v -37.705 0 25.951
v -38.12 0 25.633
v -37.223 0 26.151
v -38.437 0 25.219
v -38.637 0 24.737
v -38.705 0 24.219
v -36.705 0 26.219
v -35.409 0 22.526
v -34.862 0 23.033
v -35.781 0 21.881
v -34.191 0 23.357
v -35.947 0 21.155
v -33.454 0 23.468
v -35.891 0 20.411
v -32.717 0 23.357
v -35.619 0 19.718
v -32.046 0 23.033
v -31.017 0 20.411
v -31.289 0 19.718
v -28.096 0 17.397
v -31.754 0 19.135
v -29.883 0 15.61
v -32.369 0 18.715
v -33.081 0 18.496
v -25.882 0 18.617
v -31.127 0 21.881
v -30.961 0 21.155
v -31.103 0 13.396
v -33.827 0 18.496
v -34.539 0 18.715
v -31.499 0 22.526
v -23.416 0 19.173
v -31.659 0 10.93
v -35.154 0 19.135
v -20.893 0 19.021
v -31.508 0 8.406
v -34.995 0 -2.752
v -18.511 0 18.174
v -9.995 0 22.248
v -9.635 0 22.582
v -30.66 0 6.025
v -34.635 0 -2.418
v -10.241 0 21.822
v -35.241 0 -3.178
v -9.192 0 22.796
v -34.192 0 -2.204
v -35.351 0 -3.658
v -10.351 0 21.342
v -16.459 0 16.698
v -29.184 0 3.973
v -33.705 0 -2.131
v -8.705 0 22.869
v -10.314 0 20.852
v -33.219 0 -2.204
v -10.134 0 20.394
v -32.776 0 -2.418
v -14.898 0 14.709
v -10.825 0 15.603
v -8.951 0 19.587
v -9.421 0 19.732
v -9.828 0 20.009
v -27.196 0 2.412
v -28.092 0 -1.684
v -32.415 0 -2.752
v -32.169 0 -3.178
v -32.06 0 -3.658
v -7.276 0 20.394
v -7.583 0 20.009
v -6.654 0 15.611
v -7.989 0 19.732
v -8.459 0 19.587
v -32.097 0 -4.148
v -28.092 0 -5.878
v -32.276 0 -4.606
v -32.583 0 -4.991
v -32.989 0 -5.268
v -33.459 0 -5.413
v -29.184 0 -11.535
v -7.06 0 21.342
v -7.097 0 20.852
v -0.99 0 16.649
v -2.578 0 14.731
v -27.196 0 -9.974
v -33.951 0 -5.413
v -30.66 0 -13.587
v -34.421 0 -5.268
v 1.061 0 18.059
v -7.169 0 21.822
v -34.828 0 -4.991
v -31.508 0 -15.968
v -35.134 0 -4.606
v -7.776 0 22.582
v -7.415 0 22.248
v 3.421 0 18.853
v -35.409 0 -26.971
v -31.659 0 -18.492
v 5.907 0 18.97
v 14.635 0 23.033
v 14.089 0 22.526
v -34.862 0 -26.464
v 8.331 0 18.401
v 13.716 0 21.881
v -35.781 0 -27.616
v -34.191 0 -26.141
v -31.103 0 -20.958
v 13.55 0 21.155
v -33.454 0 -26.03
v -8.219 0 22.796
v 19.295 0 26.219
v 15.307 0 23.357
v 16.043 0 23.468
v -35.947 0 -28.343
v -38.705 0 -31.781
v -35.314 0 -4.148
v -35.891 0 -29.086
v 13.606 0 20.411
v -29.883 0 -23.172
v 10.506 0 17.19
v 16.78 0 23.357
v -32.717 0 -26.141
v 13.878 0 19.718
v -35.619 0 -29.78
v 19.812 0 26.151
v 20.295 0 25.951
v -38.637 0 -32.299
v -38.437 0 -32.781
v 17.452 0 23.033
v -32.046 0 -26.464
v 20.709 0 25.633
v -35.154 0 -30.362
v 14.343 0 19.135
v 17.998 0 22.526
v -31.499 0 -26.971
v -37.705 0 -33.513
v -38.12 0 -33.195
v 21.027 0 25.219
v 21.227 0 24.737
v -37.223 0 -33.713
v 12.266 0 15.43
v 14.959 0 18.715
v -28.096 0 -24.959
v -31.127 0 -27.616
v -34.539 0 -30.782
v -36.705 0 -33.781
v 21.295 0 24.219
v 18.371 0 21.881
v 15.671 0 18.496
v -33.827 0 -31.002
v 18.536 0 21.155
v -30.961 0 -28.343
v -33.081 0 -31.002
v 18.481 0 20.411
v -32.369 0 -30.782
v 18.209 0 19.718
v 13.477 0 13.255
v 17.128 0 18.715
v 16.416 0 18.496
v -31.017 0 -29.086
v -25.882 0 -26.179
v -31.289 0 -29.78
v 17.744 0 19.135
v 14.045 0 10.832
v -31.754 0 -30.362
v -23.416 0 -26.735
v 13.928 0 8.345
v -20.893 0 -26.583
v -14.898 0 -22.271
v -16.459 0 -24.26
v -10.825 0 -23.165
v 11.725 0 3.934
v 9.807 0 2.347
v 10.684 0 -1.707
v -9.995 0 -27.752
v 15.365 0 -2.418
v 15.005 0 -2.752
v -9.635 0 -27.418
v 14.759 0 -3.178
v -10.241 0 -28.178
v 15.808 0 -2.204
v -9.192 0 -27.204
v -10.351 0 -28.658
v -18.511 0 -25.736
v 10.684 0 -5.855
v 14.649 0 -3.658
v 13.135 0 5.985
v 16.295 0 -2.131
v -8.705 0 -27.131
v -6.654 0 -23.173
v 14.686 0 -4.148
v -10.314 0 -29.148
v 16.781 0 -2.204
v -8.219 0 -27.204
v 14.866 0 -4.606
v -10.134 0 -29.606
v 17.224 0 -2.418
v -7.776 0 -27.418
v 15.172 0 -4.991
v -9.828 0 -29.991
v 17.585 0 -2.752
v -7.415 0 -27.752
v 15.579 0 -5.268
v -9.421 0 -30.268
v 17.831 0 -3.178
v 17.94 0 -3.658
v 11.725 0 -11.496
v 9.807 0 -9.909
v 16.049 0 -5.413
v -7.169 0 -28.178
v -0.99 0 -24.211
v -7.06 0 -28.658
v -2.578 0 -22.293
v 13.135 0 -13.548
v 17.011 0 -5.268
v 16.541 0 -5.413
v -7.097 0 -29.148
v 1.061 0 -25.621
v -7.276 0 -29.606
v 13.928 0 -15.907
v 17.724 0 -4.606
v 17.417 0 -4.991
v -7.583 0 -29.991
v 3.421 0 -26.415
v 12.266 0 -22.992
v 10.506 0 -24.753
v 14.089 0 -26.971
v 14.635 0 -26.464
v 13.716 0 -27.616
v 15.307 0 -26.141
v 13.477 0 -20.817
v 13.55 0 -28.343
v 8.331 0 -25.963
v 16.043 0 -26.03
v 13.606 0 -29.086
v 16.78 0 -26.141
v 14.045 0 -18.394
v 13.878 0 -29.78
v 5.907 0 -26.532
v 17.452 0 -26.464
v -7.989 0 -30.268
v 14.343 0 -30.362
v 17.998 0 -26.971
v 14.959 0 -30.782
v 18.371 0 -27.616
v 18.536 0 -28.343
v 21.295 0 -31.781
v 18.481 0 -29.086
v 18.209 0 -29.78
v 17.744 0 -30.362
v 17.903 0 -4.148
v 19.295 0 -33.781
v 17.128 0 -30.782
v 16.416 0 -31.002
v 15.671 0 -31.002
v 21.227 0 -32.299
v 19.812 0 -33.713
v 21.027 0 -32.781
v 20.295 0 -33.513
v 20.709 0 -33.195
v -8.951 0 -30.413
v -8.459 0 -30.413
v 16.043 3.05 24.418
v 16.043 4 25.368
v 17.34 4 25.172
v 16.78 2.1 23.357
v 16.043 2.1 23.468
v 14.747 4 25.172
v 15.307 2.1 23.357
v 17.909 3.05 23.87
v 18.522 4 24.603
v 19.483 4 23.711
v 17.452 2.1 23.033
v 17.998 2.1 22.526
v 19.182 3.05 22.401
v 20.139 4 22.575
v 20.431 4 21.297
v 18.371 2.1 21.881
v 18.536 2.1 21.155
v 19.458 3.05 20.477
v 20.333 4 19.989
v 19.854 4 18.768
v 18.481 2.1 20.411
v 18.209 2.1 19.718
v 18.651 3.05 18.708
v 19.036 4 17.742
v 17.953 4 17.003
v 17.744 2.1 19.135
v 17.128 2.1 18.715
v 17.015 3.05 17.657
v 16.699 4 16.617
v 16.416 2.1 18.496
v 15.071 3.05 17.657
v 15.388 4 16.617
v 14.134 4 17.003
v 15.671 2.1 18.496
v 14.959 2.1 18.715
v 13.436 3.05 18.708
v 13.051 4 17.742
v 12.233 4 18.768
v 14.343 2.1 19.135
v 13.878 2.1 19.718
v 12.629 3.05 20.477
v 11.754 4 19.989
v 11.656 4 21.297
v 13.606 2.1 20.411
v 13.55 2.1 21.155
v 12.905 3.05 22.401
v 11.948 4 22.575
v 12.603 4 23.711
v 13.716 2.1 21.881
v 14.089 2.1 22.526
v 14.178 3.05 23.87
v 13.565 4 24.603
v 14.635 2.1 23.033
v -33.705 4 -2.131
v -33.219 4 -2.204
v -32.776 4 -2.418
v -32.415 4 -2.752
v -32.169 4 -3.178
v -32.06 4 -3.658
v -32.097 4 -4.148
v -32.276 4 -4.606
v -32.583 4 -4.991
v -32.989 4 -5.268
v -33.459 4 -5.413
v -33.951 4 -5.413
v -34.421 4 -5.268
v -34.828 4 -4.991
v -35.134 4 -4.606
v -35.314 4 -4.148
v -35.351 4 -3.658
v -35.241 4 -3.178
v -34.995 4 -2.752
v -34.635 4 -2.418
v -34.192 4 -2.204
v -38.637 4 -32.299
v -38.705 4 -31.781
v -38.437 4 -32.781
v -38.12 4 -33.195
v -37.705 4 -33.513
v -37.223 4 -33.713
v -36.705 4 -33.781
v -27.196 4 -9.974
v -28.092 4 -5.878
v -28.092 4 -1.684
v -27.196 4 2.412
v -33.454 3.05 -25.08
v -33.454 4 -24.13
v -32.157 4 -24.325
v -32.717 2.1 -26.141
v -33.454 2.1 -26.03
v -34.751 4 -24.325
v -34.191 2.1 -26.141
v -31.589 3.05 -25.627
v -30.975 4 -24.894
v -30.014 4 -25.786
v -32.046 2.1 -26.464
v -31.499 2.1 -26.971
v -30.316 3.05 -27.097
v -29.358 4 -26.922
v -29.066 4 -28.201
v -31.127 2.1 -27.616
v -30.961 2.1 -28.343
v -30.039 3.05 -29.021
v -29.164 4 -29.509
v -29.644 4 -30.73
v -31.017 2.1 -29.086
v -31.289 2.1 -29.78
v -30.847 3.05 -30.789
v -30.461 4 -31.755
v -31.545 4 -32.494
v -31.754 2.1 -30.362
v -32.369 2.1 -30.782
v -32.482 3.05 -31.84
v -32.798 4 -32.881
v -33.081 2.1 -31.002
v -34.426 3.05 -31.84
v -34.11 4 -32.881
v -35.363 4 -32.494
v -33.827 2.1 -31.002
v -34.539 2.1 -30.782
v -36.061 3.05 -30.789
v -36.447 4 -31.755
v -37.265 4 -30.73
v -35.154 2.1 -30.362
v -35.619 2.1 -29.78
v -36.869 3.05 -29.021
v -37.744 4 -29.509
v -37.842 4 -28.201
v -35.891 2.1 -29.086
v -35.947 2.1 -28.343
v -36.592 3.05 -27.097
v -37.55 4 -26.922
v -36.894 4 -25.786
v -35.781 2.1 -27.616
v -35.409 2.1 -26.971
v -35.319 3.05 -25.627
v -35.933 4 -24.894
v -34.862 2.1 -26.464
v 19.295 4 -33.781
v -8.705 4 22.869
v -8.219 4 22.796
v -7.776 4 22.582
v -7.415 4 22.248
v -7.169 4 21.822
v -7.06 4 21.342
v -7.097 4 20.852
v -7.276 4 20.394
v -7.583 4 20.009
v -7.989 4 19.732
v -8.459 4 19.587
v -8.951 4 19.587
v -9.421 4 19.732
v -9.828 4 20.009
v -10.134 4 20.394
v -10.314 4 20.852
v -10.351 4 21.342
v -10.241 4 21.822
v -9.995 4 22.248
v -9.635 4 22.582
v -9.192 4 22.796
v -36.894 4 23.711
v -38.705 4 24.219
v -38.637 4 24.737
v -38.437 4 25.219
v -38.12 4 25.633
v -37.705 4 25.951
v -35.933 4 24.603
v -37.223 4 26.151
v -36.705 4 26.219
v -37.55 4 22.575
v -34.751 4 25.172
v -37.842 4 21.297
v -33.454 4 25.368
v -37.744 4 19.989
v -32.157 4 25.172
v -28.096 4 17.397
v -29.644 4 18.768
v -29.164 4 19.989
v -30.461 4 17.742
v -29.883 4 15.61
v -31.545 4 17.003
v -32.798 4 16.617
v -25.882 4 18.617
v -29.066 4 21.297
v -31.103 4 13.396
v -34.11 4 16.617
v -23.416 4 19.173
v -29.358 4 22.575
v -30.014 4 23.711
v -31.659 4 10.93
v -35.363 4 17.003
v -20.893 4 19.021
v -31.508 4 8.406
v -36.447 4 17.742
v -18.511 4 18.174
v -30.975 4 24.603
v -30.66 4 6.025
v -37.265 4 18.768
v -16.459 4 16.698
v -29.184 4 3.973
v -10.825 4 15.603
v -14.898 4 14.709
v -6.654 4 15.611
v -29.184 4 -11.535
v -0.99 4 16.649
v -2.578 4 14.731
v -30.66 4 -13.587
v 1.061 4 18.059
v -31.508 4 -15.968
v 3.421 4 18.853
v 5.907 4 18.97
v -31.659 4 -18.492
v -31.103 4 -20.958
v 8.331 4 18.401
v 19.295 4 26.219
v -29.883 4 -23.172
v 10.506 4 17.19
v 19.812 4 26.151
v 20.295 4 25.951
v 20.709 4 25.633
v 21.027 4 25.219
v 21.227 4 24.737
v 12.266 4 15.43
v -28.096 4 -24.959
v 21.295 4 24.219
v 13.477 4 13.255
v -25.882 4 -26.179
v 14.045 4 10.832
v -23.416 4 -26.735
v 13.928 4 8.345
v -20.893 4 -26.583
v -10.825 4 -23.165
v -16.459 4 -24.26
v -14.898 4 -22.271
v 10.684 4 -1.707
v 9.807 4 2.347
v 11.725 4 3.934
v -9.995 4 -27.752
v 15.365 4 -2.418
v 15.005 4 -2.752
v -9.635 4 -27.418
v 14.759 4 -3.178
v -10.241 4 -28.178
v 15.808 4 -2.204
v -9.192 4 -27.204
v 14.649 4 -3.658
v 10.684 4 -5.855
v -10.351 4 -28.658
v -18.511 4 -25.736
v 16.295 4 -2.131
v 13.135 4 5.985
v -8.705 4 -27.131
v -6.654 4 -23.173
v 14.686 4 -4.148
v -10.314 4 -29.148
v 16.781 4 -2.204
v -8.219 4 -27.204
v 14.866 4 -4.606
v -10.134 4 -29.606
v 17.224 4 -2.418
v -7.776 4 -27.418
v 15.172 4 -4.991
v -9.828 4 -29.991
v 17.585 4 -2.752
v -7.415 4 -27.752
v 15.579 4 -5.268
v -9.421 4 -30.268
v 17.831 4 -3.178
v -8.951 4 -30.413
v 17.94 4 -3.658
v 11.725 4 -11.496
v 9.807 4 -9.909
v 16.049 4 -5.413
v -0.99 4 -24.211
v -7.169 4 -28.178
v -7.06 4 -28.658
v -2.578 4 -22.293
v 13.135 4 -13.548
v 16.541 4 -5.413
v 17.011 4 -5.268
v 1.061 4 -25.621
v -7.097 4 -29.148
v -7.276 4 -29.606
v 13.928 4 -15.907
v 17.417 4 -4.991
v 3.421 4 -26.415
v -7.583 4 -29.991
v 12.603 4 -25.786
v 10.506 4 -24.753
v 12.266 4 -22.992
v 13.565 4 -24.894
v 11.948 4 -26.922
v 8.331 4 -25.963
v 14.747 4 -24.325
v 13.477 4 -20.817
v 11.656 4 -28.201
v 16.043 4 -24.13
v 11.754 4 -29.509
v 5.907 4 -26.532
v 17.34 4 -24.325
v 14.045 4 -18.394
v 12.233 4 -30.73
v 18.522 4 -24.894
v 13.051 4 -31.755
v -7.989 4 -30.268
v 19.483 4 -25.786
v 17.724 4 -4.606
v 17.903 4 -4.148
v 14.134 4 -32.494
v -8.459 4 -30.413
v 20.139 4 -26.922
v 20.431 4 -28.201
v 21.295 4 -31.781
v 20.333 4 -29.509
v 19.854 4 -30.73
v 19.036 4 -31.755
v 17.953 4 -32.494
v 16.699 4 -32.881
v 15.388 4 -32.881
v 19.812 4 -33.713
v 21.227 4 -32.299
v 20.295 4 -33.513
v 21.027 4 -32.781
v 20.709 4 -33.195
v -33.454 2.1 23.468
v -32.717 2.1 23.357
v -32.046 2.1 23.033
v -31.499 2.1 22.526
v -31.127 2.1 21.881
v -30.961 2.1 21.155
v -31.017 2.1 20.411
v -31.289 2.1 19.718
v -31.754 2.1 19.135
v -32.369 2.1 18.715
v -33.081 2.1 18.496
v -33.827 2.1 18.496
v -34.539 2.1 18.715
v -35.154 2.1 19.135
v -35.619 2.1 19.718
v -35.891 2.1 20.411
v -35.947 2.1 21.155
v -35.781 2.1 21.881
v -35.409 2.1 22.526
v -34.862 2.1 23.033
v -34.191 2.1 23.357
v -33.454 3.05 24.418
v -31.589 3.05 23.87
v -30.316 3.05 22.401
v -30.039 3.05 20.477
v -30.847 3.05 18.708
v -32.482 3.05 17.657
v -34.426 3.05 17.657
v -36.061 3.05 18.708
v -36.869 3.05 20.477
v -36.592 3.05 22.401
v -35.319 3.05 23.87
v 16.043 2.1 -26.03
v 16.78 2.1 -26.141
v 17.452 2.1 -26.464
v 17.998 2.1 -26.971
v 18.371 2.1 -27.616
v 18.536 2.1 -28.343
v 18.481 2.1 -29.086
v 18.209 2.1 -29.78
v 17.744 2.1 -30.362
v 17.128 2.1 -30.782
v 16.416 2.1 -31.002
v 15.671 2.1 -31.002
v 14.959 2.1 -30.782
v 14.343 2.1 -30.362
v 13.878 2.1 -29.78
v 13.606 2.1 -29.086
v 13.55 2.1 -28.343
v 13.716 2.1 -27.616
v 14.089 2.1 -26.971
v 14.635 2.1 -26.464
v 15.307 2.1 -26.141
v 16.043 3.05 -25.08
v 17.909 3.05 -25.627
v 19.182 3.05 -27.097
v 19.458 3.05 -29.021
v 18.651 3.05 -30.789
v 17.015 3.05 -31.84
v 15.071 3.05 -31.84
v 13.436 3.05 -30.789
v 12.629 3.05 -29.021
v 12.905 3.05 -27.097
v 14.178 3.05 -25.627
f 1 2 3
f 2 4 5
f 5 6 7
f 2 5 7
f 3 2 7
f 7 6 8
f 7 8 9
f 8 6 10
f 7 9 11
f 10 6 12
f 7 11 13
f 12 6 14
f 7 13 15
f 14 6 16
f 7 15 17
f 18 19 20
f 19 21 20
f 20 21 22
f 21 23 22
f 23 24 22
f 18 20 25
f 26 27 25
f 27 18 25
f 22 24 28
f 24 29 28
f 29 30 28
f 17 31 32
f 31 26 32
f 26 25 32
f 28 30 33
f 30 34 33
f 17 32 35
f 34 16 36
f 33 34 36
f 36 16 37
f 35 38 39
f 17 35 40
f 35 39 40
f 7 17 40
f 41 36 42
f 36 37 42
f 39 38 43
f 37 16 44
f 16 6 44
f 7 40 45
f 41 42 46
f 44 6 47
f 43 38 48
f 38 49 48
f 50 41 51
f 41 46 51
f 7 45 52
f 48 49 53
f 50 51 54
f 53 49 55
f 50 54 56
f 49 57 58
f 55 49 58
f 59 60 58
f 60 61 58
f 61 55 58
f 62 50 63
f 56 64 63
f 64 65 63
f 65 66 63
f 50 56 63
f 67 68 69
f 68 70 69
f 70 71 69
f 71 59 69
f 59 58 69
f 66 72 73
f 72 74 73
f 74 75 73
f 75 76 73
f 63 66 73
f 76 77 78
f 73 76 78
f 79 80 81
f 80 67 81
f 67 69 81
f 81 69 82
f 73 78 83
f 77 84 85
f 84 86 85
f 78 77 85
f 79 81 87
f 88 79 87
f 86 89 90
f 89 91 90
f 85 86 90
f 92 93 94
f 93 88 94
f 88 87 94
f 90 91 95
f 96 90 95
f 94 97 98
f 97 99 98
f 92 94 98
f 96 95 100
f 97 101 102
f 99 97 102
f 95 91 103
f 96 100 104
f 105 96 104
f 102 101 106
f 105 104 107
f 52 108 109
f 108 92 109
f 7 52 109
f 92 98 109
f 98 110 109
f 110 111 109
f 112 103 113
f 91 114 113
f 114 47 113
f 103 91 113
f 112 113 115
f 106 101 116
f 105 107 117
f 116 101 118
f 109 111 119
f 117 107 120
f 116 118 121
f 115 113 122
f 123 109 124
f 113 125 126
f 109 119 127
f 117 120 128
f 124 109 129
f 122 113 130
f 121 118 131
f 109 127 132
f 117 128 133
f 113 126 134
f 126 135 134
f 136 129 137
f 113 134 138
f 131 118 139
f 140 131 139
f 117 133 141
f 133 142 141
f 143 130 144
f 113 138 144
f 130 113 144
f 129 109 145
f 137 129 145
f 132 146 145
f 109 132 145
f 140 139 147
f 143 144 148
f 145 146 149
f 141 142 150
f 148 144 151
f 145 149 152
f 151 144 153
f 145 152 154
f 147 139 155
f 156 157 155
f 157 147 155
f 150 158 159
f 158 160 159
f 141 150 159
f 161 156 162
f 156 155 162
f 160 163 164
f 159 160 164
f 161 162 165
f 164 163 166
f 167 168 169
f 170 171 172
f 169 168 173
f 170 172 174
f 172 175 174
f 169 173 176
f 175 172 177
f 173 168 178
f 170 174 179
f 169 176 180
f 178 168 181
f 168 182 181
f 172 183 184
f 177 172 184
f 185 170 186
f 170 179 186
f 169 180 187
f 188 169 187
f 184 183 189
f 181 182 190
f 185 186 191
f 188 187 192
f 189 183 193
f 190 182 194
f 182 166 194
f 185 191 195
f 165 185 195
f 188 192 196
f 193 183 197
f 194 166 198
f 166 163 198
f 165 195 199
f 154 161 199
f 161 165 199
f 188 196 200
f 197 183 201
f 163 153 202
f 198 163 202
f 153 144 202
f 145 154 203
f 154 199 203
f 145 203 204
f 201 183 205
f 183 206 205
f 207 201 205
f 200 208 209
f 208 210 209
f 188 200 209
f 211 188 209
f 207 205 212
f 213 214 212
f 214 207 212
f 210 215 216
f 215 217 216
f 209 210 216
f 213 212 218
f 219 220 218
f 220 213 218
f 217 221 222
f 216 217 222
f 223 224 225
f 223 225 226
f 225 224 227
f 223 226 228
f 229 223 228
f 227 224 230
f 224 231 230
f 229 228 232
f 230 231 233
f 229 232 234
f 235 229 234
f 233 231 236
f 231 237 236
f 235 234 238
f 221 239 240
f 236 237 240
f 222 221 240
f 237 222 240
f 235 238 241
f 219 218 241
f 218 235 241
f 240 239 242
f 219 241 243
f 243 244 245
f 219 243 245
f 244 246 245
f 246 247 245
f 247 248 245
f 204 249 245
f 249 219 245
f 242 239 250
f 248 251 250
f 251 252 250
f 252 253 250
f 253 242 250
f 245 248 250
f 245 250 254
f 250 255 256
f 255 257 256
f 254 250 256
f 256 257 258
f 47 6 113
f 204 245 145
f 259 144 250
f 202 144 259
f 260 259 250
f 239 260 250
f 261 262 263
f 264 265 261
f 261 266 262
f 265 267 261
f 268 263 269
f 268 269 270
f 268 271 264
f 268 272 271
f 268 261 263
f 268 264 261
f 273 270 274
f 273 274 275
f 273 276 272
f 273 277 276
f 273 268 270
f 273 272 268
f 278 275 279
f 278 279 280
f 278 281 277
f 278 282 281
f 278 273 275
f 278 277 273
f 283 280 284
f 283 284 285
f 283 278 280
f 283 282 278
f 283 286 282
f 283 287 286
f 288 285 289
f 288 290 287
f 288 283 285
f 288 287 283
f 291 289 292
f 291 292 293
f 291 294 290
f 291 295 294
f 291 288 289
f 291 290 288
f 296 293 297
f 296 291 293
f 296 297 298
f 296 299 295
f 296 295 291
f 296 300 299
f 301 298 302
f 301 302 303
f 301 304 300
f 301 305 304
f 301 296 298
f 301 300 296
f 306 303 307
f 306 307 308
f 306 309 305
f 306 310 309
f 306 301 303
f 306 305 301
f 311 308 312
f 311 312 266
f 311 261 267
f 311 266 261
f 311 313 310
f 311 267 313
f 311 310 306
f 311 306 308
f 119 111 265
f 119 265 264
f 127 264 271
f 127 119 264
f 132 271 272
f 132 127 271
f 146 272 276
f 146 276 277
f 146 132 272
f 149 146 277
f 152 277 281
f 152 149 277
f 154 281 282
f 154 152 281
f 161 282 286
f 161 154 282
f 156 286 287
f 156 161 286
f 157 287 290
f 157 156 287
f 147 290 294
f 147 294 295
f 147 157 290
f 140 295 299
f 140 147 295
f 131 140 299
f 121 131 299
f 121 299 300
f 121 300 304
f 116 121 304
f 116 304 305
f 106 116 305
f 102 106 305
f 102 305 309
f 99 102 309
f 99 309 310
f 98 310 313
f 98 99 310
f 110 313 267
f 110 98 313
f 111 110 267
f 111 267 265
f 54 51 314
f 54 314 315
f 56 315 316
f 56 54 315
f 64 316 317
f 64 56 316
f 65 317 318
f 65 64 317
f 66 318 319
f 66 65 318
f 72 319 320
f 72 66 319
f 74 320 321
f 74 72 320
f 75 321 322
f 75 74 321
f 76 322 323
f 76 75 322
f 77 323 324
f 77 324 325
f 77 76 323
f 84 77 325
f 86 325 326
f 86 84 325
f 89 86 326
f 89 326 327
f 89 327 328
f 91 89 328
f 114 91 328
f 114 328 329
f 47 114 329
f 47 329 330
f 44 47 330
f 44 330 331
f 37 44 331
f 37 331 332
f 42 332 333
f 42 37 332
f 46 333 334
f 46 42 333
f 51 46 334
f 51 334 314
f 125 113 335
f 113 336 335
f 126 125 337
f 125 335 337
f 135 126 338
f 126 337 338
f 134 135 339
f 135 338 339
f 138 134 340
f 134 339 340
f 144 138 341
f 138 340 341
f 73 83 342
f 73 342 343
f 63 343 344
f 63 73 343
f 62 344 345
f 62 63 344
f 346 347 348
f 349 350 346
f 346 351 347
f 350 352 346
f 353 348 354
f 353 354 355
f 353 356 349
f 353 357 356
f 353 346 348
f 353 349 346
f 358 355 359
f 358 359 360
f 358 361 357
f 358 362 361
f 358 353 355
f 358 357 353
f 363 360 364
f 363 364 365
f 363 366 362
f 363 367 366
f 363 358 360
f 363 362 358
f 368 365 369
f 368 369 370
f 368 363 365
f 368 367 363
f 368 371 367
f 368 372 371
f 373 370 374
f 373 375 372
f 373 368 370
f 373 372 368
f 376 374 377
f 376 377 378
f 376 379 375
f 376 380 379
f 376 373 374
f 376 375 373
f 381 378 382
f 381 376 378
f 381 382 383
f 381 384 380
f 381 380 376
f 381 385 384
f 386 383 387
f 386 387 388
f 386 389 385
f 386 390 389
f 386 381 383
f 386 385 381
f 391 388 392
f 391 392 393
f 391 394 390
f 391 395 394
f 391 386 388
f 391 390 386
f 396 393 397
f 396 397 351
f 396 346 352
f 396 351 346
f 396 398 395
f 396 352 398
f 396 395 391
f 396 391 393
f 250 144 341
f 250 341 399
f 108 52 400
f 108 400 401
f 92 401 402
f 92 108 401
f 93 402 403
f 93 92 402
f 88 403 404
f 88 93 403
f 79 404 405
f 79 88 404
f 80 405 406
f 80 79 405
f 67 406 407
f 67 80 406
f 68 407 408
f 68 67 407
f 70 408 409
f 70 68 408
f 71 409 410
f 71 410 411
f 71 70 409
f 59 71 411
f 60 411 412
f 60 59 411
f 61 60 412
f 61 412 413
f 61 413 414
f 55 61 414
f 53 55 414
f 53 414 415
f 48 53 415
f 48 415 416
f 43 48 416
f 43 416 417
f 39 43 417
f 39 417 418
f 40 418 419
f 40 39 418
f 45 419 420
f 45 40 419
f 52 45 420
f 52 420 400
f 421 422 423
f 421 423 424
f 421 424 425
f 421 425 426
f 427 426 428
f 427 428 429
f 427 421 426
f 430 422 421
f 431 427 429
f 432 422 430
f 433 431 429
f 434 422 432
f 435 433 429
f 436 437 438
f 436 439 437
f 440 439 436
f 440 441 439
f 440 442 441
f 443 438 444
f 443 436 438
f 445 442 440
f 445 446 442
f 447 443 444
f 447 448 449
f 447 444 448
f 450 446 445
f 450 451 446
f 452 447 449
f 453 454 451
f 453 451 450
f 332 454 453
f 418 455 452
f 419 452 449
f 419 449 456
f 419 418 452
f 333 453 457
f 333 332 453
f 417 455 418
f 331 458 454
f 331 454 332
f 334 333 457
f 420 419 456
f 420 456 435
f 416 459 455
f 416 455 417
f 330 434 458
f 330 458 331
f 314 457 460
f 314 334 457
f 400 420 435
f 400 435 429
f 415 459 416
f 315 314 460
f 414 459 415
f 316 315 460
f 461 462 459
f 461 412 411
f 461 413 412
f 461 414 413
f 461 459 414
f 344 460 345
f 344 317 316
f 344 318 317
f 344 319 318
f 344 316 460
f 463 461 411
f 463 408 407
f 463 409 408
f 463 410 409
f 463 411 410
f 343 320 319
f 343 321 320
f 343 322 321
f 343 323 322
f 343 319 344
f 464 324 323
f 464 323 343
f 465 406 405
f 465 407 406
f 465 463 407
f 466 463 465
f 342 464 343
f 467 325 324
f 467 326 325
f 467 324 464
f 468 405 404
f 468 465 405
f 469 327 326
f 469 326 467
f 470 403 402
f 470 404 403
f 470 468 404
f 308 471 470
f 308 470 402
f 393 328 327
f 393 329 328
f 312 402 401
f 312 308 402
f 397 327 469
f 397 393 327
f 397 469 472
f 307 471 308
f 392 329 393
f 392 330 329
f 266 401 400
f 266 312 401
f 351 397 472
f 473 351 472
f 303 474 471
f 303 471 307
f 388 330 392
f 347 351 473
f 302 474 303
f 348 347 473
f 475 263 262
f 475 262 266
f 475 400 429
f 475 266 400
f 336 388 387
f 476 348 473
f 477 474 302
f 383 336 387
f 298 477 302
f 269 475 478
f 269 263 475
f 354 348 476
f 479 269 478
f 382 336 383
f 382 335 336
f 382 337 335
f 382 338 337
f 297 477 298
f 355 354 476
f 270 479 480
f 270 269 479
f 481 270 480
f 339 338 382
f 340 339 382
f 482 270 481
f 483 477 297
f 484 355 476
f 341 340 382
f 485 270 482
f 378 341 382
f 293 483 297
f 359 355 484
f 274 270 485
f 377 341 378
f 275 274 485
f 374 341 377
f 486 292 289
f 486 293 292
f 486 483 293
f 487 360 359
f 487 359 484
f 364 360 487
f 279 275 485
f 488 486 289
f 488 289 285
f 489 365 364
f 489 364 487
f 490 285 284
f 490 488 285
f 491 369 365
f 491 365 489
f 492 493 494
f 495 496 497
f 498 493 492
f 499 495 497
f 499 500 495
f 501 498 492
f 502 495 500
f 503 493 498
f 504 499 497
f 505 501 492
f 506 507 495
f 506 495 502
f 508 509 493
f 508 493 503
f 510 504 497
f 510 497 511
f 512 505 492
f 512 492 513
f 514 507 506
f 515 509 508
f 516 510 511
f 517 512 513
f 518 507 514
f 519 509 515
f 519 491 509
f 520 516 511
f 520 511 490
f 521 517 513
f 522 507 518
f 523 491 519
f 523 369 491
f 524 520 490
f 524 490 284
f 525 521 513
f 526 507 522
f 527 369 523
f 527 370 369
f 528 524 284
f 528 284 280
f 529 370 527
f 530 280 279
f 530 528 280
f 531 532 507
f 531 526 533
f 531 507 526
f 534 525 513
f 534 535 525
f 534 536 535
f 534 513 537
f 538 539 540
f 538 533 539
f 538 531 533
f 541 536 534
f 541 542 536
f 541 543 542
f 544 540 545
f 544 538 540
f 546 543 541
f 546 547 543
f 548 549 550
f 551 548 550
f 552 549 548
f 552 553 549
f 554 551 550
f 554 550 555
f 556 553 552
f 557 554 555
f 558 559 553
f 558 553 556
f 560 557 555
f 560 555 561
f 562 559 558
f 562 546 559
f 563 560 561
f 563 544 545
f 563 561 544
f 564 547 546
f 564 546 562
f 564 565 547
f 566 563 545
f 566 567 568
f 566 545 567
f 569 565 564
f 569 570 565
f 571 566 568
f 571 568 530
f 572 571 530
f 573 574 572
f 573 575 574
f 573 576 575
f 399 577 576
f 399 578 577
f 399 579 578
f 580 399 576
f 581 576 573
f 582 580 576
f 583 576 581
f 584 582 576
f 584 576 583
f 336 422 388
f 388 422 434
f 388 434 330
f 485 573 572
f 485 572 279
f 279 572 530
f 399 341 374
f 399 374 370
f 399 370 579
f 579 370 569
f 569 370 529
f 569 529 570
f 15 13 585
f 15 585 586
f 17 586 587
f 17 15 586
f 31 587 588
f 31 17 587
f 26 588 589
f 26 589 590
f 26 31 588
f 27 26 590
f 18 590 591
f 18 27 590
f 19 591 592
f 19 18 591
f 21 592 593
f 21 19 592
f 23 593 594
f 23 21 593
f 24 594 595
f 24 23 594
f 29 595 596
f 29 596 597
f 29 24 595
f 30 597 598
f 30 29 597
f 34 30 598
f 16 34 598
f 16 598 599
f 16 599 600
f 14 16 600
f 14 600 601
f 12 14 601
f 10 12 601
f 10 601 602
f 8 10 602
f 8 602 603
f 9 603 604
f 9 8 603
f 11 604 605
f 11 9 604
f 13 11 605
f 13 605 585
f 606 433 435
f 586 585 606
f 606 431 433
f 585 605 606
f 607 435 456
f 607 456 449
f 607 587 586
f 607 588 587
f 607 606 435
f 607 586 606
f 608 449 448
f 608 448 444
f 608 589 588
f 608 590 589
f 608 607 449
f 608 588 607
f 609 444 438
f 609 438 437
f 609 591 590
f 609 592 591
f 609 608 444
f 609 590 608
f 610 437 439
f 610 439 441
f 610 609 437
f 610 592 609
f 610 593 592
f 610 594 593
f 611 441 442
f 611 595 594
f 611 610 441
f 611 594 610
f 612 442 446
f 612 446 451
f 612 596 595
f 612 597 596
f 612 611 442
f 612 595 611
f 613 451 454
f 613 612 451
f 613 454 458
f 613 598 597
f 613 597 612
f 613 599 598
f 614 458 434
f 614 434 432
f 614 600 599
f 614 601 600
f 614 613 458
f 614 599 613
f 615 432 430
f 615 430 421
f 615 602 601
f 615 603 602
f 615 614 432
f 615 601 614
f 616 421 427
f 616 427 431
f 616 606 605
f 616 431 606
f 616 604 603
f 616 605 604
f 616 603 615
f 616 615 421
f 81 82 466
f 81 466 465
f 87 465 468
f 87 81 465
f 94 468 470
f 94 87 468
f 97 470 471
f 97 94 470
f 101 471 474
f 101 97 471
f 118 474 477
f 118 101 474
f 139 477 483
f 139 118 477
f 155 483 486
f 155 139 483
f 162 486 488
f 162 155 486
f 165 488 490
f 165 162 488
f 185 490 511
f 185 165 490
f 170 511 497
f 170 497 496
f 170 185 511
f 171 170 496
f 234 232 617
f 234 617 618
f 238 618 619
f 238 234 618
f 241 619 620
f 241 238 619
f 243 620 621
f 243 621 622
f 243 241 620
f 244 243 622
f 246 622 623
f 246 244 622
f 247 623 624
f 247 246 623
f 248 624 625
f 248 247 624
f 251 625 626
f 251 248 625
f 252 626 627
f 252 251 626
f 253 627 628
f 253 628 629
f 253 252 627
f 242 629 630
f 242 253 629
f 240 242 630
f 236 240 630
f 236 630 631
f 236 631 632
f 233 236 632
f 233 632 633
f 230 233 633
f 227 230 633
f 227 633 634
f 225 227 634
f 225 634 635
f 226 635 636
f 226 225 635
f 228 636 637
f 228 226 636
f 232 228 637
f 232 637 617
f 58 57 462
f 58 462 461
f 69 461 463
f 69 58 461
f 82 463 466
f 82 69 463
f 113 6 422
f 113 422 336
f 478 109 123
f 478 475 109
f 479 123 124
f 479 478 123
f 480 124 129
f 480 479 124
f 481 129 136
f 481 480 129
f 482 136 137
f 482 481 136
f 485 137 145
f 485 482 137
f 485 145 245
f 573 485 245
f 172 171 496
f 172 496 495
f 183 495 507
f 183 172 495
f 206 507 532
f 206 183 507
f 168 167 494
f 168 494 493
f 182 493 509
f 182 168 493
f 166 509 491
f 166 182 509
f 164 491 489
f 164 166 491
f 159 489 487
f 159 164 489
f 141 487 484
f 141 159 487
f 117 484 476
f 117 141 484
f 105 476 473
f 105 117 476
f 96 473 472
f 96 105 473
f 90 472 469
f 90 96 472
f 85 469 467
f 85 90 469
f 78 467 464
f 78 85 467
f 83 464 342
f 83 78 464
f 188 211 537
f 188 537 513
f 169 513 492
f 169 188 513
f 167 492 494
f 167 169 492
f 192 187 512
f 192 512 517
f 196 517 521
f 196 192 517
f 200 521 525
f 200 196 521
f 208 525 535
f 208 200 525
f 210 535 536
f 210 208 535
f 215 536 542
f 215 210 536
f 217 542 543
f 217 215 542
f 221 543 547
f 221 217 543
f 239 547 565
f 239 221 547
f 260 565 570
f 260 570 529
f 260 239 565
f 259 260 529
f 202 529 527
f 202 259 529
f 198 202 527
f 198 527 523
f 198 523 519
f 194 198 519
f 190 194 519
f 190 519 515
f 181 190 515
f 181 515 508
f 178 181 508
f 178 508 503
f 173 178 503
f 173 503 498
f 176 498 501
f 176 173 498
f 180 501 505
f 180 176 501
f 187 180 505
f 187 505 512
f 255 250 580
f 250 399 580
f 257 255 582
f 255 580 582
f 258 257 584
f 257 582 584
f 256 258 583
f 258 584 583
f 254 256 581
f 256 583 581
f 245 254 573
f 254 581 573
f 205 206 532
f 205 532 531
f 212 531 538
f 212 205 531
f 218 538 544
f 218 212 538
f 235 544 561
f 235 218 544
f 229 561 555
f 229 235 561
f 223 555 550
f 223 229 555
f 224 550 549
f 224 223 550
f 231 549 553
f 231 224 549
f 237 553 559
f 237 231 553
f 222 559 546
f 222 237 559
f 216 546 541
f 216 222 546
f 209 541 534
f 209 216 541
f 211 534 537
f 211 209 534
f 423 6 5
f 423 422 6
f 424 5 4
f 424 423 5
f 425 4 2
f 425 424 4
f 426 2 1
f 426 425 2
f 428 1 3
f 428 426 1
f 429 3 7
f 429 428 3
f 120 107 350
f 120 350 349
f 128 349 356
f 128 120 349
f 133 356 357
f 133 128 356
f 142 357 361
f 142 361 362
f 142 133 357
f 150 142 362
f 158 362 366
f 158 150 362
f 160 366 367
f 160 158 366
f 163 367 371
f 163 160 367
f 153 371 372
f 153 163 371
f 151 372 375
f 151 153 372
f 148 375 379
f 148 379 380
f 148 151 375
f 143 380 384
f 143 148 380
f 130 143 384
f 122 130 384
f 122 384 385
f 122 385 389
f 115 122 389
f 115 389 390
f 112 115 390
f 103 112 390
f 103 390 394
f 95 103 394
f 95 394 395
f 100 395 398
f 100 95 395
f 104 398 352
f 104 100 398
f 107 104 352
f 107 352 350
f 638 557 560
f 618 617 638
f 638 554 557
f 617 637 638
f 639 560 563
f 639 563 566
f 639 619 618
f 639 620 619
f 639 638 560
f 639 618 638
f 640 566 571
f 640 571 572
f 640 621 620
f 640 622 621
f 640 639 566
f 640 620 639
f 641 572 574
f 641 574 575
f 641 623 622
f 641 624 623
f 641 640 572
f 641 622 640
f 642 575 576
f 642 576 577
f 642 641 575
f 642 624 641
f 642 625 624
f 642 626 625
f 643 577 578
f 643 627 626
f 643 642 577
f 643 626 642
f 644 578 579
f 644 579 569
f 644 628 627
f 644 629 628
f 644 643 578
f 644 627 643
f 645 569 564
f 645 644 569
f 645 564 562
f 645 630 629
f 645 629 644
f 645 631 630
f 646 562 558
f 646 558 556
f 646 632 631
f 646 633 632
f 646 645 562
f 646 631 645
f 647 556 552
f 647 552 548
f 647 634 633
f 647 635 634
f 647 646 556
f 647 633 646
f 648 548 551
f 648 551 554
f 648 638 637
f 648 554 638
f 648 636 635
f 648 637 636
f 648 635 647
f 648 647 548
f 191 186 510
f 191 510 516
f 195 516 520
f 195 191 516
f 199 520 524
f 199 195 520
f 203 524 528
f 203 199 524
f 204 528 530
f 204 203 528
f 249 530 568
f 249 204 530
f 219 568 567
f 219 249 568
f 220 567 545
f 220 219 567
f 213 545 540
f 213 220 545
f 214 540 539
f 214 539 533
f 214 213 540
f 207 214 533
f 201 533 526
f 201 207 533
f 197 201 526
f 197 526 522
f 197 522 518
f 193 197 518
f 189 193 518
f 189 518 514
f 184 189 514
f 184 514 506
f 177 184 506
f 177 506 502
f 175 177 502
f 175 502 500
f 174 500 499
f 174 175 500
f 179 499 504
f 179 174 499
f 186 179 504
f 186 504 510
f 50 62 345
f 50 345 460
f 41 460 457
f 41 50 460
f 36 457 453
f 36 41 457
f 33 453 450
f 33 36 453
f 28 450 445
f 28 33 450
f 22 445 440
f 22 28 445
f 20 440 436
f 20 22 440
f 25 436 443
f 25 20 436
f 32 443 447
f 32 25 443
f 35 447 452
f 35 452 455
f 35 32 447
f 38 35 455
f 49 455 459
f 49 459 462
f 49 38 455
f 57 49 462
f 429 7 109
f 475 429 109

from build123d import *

# Parameters (mm, degrees)
SKETCH_1_W      = 60
SKETCH_1_H      = 60
SKETCH_1_R      = 2.5
SKETCH_1_R_2    = 1.65
EXTRUDE_1_DEPTH = 4
FILLET_1_R      = 2
CHAMFER_1_SIZE  = 1.9


with BuildPart() as part:
    # Эскиз1 → Бобышка-Вытянуть1 (new body)
    with BuildSketch(Plane(origin=(0, 0, 0), x_dir=(1, 0, 0), z_dir=(0, 1, 0))):
        with Locations((-8.705299467, 3.781032797)):
            Rectangle(SKETCH_1_W, SKETCH_1_H)
        with Locations(Location((-33.454036809, 28.529770139, 0), (0, 0, 270))):
            Circle(SKETCH_1_R, mode=Mode.SUBTRACT)
        with Locations(Location((16.043437874, 28.529770139, 0), (0, 0, 270))):
            Circle(SKETCH_1_R, mode=Mode.SUBTRACT)
        with Locations(Location((-33.454036809, -20.967704544, 0), (0, 0, 270))):
            Circle(SKETCH_1_R, mode=Mode.SUBTRACT)
        with Locations(Location((16.043437874, -20.967704544, 0), (0, 0, 270))):
            Circle(SKETCH_1_R, mode=Mode.SUBTRACT)
        with Locations(Location((-33.705299467, 3.781032797, 0), (0, 0, 270))):
            Circle(SKETCH_1_R_2, mode=Mode.SUBTRACT)
        with Locations(Location((16.294700533, 3.781032797, 0), (0, 0, 270))):
            Circle(SKETCH_1_R_2, mode=Mode.SUBTRACT)
        with Locations(Location((-8.705299467, 28.781032797, 0), (0, 0, 270))):
            Circle(SKETCH_1_R_2, mode=Mode.SUBTRACT)
        with Locations(Location((-8.705299467, -21.218967203, 0), (0, 0, 270))):
            Circle(SKETCH_1_R_2, mode=Mode.SUBTRACT)
        with BuildLine():
            ThreePointArc((-27.195682571, 9.974233316), (-28.205299467, 3.781032797), (-27.195682571, -2.412167721))
            ThreePointArc((-27.195682571, -2.412167721), (-29.05264456, -16.566312295), (-14.898499986, -14.709350307))
            ThreePointArc((-14.898499986, -14.709350307), (-8.739771419, -15.718936733), (-2.577511871, -14.731131289))
            ThreePointArc((-2.577511871, -14.731131289), (11.447243796, -16.371510466), (9.806864619, -2.346754799))
            ThreePointArc((9.806864619, -2.346754799), (10.794700533, 3.781032797), (9.806864619, 9.908820393))
            ThreePointArc((9.806864619, 9.908820393), (11.447243796, 23.933576061), (-2.577511871, 22.293196884))
            ThreePointArc((-2.577511871, 22.293196884), (-8.739771419, 23.281002328), (-14.898499986, 22.271415901))
            ThreePointArc((-14.898499986, 22.271415901), (-29.05264456, 24.12837789), (-27.195682571, 9.974233316))
        make_face(mode=Mode.SUBTRACT)
    extrude(amount=EXTRUDE_1_DEPTH)

    # Скругление1
    fillet_1_edges = [part.edges().sort_by_distance(p)[0] for p in [
        (-38.705299467, 2, -33.781032797),
        (21.294700533, 2, -33.781032797),
        (21.294700533, 2, 26.218967203),
        (-38.705299467, 2, 26.218967203),
    ]]
    fillet(fillet_1_edges, radius=FILLET_1_R)

    # Фаска1
    chamfer_1_edges = [part.edges().sort_by_distance(p)[0] for p in [
        (-33.454036809, 4, -31.029770139),
        (16.043437874, 4, -31.029770139),
        (-33.454036809, 4, 18.467704544),
        (16.043437874, 4, 18.467704544),
    ]]
    chamfer(chamfer_1_edges, length=CHAMFER_1_SIZE)


solid = part.part
